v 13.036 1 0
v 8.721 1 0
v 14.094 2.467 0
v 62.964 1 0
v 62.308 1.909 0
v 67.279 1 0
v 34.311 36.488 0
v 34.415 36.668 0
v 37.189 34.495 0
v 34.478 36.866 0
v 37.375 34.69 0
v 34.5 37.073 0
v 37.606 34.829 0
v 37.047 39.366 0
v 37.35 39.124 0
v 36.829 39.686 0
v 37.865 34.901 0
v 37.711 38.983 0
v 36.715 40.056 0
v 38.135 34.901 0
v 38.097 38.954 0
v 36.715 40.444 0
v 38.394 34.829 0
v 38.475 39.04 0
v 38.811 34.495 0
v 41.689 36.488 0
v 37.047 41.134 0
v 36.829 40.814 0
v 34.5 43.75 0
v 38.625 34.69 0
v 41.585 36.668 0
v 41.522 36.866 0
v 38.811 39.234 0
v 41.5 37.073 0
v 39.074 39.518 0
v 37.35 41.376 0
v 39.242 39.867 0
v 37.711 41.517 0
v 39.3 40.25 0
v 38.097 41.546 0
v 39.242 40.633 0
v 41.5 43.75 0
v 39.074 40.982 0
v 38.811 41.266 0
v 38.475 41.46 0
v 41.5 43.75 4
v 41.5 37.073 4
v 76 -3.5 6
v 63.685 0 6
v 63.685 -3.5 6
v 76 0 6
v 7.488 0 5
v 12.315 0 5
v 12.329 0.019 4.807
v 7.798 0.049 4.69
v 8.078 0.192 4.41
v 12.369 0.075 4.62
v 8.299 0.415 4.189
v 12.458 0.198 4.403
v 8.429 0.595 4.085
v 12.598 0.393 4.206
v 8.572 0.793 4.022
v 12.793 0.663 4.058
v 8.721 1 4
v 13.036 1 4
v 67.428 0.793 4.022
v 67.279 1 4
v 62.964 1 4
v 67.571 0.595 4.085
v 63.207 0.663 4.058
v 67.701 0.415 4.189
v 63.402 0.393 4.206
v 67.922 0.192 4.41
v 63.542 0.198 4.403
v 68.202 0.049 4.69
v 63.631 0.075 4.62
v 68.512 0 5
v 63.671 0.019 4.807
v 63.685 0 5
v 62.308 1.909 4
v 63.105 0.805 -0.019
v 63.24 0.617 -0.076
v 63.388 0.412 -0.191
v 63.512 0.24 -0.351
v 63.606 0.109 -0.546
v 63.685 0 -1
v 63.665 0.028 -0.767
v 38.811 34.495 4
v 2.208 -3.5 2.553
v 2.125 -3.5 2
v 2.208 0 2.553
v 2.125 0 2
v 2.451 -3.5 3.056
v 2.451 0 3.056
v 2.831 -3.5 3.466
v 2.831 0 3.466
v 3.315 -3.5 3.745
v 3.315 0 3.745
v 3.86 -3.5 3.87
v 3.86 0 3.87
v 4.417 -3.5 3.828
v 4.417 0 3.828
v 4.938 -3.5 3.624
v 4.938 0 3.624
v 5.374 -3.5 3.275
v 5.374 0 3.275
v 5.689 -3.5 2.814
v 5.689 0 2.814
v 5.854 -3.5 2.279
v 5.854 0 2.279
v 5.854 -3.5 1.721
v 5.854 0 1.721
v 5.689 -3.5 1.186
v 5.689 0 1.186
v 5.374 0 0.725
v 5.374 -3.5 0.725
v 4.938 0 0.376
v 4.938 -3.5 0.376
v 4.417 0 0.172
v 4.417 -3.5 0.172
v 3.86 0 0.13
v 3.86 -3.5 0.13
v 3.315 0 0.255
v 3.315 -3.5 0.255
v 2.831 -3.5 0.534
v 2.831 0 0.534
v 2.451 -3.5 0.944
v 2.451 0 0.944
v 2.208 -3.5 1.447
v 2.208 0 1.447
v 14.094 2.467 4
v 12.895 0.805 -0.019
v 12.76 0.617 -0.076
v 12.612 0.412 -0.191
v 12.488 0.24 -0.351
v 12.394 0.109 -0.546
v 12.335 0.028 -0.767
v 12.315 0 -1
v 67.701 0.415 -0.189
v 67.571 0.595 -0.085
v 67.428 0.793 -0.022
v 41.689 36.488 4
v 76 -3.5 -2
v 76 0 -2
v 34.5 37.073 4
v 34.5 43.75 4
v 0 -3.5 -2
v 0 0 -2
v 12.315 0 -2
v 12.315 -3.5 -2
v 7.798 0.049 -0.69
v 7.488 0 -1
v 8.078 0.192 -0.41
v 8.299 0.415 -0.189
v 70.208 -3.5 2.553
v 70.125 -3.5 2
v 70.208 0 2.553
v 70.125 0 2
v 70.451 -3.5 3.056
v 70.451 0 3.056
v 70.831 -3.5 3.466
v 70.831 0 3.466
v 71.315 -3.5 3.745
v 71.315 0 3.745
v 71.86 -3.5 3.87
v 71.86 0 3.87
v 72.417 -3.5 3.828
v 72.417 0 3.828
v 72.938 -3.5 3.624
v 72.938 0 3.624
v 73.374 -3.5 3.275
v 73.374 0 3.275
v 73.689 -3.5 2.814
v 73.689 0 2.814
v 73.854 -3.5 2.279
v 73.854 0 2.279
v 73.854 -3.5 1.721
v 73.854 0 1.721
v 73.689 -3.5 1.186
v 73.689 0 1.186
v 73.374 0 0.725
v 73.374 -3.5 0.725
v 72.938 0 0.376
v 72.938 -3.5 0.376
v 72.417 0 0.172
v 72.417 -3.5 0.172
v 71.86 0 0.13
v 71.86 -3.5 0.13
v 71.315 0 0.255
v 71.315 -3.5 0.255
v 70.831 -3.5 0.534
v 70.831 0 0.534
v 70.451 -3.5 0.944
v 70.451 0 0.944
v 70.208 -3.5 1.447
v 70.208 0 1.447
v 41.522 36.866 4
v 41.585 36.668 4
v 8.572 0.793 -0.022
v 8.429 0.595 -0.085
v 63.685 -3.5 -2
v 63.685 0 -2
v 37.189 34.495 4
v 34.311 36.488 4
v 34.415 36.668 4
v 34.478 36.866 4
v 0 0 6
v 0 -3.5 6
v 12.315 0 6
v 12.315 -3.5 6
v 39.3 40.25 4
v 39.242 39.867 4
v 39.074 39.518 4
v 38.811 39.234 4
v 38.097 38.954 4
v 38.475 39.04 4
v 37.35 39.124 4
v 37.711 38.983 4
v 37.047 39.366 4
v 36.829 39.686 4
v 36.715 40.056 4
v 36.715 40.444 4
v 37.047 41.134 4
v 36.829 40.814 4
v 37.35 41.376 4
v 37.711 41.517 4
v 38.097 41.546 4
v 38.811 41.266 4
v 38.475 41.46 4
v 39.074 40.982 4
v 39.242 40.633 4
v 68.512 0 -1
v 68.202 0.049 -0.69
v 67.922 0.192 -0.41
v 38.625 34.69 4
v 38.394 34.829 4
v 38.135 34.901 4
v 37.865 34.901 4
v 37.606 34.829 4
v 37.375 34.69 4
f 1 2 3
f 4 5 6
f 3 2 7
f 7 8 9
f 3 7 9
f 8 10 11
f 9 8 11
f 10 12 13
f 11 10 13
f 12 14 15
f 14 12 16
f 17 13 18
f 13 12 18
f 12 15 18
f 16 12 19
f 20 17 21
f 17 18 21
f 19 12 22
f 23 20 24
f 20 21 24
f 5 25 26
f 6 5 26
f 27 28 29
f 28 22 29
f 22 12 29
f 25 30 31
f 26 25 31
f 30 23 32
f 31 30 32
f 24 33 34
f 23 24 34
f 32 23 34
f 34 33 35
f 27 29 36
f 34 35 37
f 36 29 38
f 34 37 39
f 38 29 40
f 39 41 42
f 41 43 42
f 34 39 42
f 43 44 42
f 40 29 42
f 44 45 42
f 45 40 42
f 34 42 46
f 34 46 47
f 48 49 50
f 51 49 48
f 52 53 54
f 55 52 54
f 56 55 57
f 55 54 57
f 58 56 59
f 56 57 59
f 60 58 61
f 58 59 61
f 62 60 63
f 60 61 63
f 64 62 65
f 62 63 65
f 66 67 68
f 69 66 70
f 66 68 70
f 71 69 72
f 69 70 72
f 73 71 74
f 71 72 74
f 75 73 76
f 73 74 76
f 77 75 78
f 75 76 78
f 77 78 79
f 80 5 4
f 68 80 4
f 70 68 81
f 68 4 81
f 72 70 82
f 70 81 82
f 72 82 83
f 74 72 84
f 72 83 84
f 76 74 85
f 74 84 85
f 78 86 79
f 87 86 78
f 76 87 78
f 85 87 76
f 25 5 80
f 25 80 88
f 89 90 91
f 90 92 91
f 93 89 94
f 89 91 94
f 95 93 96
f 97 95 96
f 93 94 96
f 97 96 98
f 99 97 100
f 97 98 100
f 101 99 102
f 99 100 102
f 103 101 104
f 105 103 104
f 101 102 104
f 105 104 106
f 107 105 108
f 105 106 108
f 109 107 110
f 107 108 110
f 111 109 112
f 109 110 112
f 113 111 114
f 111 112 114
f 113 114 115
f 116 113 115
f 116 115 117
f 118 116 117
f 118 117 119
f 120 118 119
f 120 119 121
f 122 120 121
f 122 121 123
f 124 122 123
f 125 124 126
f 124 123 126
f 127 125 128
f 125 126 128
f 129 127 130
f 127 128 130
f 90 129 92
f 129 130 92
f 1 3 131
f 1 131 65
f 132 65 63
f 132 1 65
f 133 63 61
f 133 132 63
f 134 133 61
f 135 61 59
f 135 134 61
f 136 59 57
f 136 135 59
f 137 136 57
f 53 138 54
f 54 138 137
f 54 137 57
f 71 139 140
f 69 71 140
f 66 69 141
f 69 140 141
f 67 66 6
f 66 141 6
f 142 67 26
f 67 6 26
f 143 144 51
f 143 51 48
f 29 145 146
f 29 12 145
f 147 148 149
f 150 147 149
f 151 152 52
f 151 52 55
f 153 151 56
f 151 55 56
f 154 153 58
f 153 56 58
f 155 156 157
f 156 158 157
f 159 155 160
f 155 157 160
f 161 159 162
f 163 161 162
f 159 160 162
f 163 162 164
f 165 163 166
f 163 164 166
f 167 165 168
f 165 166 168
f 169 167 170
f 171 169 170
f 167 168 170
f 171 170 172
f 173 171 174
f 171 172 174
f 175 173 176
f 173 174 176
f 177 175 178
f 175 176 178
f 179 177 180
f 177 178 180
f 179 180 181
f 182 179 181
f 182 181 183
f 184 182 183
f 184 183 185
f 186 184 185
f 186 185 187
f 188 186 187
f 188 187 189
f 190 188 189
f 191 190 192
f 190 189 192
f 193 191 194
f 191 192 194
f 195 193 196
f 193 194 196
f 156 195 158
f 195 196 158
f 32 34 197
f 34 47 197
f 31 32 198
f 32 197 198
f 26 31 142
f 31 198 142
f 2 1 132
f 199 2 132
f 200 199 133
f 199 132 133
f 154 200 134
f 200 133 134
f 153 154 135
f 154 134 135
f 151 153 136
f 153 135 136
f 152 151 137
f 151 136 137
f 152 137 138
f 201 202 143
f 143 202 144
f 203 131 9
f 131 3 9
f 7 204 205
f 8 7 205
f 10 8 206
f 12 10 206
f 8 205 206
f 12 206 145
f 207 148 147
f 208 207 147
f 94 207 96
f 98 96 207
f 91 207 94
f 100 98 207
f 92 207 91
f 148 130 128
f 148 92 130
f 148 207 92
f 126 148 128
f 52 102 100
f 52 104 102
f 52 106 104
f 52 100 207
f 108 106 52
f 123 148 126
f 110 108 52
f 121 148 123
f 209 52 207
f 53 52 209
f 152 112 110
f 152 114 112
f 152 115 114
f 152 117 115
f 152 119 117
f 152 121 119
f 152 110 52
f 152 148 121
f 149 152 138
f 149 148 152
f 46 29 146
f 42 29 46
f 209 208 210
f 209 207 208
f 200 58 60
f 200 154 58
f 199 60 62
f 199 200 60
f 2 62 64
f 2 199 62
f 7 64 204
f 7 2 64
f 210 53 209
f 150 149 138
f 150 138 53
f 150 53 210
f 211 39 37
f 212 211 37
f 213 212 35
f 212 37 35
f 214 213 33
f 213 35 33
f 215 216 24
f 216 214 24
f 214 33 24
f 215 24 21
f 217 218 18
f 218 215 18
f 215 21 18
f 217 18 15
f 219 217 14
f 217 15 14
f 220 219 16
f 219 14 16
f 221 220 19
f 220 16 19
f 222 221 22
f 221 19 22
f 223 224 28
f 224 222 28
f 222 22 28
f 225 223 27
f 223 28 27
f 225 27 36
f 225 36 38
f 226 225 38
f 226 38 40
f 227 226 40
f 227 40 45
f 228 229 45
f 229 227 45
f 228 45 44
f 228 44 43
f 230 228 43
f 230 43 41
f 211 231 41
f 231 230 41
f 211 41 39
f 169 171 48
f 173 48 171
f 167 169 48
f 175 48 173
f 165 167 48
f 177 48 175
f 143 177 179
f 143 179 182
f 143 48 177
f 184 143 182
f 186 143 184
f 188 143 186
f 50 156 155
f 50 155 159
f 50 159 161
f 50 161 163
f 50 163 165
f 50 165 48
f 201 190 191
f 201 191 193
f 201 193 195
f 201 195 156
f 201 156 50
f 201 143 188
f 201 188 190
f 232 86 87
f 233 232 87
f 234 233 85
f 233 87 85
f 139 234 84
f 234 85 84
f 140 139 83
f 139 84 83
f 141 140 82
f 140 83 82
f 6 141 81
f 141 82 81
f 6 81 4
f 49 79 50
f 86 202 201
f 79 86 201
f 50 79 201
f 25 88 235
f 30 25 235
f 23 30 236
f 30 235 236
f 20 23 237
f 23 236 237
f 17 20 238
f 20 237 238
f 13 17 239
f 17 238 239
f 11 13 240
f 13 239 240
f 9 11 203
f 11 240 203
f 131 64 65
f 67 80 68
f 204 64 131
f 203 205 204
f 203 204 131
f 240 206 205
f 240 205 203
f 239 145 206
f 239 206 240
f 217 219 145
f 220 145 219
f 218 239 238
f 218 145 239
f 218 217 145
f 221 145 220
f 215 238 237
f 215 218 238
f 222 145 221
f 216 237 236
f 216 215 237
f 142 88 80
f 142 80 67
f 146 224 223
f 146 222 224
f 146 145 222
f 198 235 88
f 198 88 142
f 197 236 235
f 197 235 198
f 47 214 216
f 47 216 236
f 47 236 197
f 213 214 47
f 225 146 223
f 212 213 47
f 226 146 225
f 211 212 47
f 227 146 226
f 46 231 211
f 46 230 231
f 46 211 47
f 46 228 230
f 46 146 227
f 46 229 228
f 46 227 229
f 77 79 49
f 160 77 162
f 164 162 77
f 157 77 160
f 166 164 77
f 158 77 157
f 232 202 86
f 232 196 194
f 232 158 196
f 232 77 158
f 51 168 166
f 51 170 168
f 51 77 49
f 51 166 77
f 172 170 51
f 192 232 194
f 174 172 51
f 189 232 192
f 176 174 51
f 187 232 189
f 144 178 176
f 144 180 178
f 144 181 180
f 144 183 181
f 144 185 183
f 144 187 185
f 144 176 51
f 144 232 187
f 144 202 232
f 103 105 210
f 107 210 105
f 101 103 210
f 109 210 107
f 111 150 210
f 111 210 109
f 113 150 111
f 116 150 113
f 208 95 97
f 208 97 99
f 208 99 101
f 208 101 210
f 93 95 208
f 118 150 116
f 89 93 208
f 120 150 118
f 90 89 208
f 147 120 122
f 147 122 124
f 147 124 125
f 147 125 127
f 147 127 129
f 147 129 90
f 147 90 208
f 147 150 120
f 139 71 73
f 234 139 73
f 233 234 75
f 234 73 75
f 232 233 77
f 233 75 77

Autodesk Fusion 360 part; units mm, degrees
sketch "Sketch1" plane through (0, 0, 0) normal (0, 0, 1) x (1, 0, 0)
  line L0 (0, 0) -> (8, 0)
  line L1 (8, 0) -> (38, 0) construction
  line L2 (38, 0) -> (38, 40.25) construction
  circle A0 centre (38, 40.25) radius 1.3
  line L3 (41.5, 36.75) -> (34.5, 36.75)
  line L4 (34.5, 36.75) -> (34.5, 43.75)
  line L5 (34.5, 43.75) -> (41.5, 43.75)
  line L6 (41.5, 43.75) -> (41.5, 36.75)
  line L7 (41.5, 36.75) -> (34.5, 43.75) construction
  line L8 (34.5, 36.75) -> (41.5, 43.75) construction
  line L9 (8, 0) -> (34.5, 36.75)
  line L10 (38, 0) -> (68, 0) construction
  line L11 (68, 0) -> (76, 0)
  line L12 (68, 0) -> (41.5, 36.75)
  line L13 (76, 0) -> (76, -3.5)
  line L14 (76, -3.5) -> (68, -3.5)
  line L15 (0, 0) -> (0, -3.5)
  line L16 (0, -3.5) -> (8, -3.5)
  line L17 (11.2549, 4.5139) -> (14.0938, 2.4668) construction
  line L18 (8, -3.5) -> (9.7912, -3.5)
  line L19 (14.0938, 2.4668) -> (38, 35.6197)
  line L20 (65.1473, 3.9562) -> (62.3083, 1.9091) construction
  line L21 (62.3083, 1.9091) -> (38, 35.6197)
  line L22 (68, -3.5) -> (66.2088, -3.5)
  line L23 (8, 0) -> (12.315, 0)
  line L24 (68, 0) -> (63.685, 0)
  line L25 (14.0938, 2.4668) -> (12.315, 0)
  line L26 (12.315, 0) -> (12.315, -3.5)
  line L27 (12.315, -3.5) -> (9.7912, -3.5)
  line L28 (62.3083, 1.9091) -> (63.685, 0)
  line L29 (63.685, 0) -> (63.685, -3.5)
  line L30 (66.2088, -3.5) -> (63.685, -3.5)
  point P0 (38, 40.25)
  dimension "d1" = 8
  dimension "d2" = 30
  dimension "d3" = 40.25
  dimension "d4" = 2.6
  dimension "d5" = 7
  dimension "d6" = 7
  dimension "d7" = 30
  dimension "d8" = 8
  dimension "d9" = 3.5
  dimension "d10" = 3.5
extrude "Extrude1" add sketch "Sketch1" along normal blind 4 contours L3 L9 L12 L19 L21 L23 L24 L25 L28 | L3 L4 L5 L6 makes body 1
extrude "Extrude2" add sketch "Sketch1" along normal blind 6 separate body contours L0 L15 L16 L18 L23 L26 L27 | L11 L13 L14 L22 L24 L29 L30 makes body 2 at (67.79, 0, 2) makes body 3 at (4.105, 0, 2)
extrude "Extrude3" add sketch "Sketch1" against normal blind 2 contours L0 L15 L16 L18 L23 L26 L27 | L11 L13 L14 L22 L24 L29 L30 bodies 1 2 3
sketch "Sketch2" plane through (0, 0, 0) normal (0, 1, 0) x (-1, 0, 0)
  line L0 (-12.315, 4) -> (-8, 4)
  line L1 (-8, 4) -> (-8, 0)
  line L2 (-8, 0) -> (-12.315, 0)
  line L3 (-12.315, -2) -> (0, -2)
  line L4 (0, -2) -> (0, 6)
  line L5 (0, 6) -> (-12.315, 6)
  line L6 (-8.0111, 1.6089) -> (0, 2) construction
  line L7 (-4, 6) -> (-4, -2) construction
  circle A0 centre (-4, 2) radius 1.875
  line L8 (-12.315, 0) -> (-12.315, -2)
  line L9 (-12.315, 6) -> (-12.315, 4)
  dimension "d19" = 4
  dimension "d20" = 3.75
extrude "Extrude4" cut sketch "Sketch2" against normal blind 3.5 contours A0 bodies 1
sketch "Sketch3" plane through (0, 0, 0) normal (0, 1, 0) x (-1, 0, 0)
  line L0 (-68, 4) -> (-63.685, 4)
  line L1 (-63.685, 4) -> (-63.685, 6)
  line L2 (-63.685, 6) -> (-76, 6)
  line L3 (-76, 6) -> (-76, -2)
  line L4 (-76, -2) -> (-63.685, -2)
  line L5 (-63.685, -2) -> (-63.685, 0)
  line L6 (-63.685, 0) -> (-68, 0)
  line L7 (-68, 0) -> (-68, 4)
  line L8 (-76, 2) -> (-68, 2) construction
  line L9 (-72, 6) -> (-72, -2) construction
  circle A0 centre (-72, 2) radius 1.875
  dimension "d23" = 4
  dimension "d24" = 3.75
extrude "Extrude5" cut sketch "Sketch3" against normal blind 3.5 contours A0 bodies 1
fillet "Fillet1" radius 1 2 edges at (41.5, 36.75, 2) (34.5, 36.75, 2) on bodies 1
fillet "Fillet2" radius 1 3 edges at (68, 0, 2) (65.8425, 0, 0) (65.8425, 0, 4) on bodies 1
fillet "Fillet3" radius 1 3 edges at (8, 0, 2) (10.1575, 0, 4) (10.1575, 0, 0) on bodies 1
fillet "Fillet4" radius 1 1 edges at (38, 35.6197, 2) on bodies 1
